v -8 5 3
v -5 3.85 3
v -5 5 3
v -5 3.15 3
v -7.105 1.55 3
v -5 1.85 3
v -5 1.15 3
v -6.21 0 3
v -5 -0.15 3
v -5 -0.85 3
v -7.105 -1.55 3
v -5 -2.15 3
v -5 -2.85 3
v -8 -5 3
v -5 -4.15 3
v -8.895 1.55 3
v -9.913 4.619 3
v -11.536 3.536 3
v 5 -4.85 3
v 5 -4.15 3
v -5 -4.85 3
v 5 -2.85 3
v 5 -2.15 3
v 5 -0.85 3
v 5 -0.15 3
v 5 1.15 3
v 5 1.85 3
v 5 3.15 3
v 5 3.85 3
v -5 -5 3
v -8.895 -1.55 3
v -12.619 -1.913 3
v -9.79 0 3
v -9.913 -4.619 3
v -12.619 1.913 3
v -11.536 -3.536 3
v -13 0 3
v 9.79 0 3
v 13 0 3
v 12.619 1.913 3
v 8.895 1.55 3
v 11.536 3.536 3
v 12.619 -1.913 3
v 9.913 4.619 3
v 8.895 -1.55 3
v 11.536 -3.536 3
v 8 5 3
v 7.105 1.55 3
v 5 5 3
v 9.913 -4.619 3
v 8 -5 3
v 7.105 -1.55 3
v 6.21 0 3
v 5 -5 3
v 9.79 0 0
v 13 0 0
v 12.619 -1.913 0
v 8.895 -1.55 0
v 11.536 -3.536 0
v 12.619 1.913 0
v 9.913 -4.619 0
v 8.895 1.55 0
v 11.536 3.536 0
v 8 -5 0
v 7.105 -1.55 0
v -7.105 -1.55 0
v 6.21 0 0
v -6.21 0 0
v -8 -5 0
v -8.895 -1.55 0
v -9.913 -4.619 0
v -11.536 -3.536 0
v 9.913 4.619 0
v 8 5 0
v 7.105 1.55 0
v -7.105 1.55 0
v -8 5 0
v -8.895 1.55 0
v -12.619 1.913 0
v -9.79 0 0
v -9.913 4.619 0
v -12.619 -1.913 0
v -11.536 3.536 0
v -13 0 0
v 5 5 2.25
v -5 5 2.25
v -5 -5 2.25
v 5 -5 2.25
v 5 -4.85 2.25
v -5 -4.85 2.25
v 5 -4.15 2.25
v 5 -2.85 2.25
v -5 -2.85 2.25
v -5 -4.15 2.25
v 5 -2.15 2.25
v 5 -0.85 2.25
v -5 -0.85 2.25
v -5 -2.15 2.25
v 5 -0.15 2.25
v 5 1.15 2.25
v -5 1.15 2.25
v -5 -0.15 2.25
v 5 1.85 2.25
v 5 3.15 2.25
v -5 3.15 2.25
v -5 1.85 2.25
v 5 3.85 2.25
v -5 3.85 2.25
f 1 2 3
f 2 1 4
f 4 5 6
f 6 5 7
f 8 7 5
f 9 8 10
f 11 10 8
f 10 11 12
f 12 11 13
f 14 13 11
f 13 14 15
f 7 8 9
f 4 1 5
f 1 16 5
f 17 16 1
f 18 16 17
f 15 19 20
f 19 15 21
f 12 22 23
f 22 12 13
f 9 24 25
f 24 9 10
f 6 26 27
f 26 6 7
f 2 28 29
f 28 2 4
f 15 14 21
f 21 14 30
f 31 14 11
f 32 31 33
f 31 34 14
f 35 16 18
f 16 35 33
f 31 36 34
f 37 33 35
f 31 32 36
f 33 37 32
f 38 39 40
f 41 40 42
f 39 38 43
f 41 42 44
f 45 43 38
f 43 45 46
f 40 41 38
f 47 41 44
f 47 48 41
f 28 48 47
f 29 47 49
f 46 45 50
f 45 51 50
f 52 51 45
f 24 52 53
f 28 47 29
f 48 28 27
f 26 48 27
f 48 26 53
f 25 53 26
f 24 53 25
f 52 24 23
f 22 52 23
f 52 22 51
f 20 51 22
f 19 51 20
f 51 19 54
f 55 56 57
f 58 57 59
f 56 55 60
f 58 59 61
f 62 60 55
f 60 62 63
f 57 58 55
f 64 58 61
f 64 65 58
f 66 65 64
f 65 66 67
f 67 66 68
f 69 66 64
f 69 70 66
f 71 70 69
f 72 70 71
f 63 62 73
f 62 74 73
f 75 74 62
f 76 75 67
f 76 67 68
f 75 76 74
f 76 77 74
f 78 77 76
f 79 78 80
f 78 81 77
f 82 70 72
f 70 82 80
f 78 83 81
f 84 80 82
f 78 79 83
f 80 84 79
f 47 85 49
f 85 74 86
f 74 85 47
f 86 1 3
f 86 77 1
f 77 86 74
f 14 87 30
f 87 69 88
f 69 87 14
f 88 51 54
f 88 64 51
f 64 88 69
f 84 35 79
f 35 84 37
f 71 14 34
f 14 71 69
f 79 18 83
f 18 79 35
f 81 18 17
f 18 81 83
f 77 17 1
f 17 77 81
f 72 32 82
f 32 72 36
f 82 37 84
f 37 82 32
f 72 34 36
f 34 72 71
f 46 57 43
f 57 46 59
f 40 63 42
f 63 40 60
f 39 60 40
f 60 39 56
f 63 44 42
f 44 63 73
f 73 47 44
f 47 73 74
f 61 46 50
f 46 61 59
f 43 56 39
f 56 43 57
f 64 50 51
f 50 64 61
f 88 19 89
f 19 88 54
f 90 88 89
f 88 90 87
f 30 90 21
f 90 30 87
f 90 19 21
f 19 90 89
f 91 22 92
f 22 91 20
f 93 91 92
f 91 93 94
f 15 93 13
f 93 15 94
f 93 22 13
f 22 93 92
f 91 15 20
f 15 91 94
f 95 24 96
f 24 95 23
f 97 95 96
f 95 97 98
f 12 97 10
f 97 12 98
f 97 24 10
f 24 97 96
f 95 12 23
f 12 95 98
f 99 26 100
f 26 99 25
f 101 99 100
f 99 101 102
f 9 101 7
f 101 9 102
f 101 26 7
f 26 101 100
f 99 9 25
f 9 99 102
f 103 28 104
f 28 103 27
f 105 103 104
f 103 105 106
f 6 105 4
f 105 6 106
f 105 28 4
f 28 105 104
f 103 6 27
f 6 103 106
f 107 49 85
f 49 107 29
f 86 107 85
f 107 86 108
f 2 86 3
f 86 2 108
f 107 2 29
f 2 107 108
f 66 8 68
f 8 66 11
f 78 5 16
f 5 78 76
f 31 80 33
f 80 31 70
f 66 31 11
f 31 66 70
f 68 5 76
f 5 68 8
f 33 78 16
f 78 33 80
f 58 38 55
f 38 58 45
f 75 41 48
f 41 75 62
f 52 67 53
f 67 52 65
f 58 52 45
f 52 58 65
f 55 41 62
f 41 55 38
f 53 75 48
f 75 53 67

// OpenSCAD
// file: functions.scad
// PRUSA Mendel  
// Functions used in many files
// GNU GPL v3
// Josef Průša
// josefprusa@me.com
// prusadjs.cz
// http://www.reprap.org/wiki/Prusa_Mendel
// http://github.com/prusajr/PrusaMendel


module nut(d,h,horizontal=true){
cornerdiameter =  (d / 2) / cos (180 / 6);
cylinder(h = h, r = cornerdiameter, $fn = 6);
if(horizontal){
for(i = [1:6]){
	rotate([0,0,60*i]) translate([-cornerdiameter-0.2,0,0]) rotate([0,0,-45]) cube(size = [2,2,h]);
}}
}

// Based on nophead research
module polyhole(d,h) {
    n = max(round(2 * d),3);
    rotate([0,0,180])
        cylinder(h = h, r = (d / 2) / cos (180 / n), $fn = n);
}




module roundcorner(diameter){
	difference(){
		cube(size = [diameter,diameter,99], center = false);
		translate(v = [diameter, diameter, 0]) cylinder(h = 100, r=diameter, center=false,$fn = max(3*diameter,20));
	}
}

module t25_indent()
{
	union()
	{
		for(z=[-5:5])
			translate([0,-5,z*2.5])
				difference()
				{
					cube([30,10,1.25],center=true);
					translate([0, 5, 1.7])
						rotate([-45,0,0])
							cube([40,10,2],center=true);
					translate([0, 5, -1.7])
						rotate([45,0,0])
							cube([40,10,2],center=true);

				}
	}
}
// file: configuration.scad
// PRUSA Mendel  
// Configuration file
// GNU GPL v2
// Josef Pra
// josefprusa@me.com
// prusadjs.cz
// http://www.reprap.org/wiki/Prusa_Mendel
// http://github.com/prusajr/PrusaMendel


// PLEASE SELECT ONE OF THE CONFIGURATIONS BELOW
// BY UN-COMMENTING IT


variant=0; //0 for metric
//variant=1; //1 for SAE
if(variant==0){
echo("variant: metric");
}else if(variant==1){
echo("variant: sae");
} else{
echo("WARNING: INVALID CONFIGURATION");
}




vars=[
//[m8_dia,m8_nut, m4_dia, m4_nut, m3_dia, m3_nut, bush_dia, mot_shaft, bush_rod, bush_outerdia, bush_length, m5_dia, m5_nut]
[8.4, 14.8, 4.3,8.1, 3.1, 6.5, 11, 5.3, 8, 16, 11, 5.3,9.3],//metric - M3 nut was 7; M3 was 4.4
[9,15.7,5.5,10.6,5.5,10.6,11.5,5.3,7.9375,16,11,5.6, 10]//SAE
];


//BUSHING TYPE Can generate three versions
// 1 - regular old ones
// 2 - helical ones
// 3 - holders for brass or any other bought bushings
bushing_type = 2;


//Round corner diameter
round_corner_diameter = 8;


//Thin wall size
layer_height = 0.4;
perimeter_width_over_thicknes = 1.6;
infill_widht_over_thickness = 1.55;
thin_wall = 2*(perimeter_width_over_thicknes*layer_height+infill_widht_over_thickness*layer_height);
if(thin_wall<2){
	echo("Check thin wall size, its below 2mm!");
}
echo(thin_wall);


//DO NOT TOUCH THIS SECTION!
m8_diameter = vars[variant][0];
m8_nut_diameter = vars[variant][1];
m4_diameter = vars[variant][2];
m4_nut_diameter = vars[variant][3];
m3_diameter = vars[variant][4];
m3_nut_diameter = vars[variant][5];
bushing_diameter = vars[variant][6];
motor_shaft=vars[variant][7];
bushing_rodsize = vars[variant][8];
bushing_outerDiameter = vars[variant][9];
bushing_lenght = vars[variant][10];
m5_diameter = vars[variant][11];
m5_nut_diameter = vars[variant][12];



// MINI-HUXLEY VERSION (TODO, just place holder)
// include <configuration-huxley.scad>


// MEGA VERSION (TODO, just place holder)
// include <configuration-mega.scad>

// Gap between the X rods

x_rod_centres=70;
y_rod_centres=183;
belt_width=6;
belt_clamp_centres=18;
ptfe_diameter=4;
z_slot_width=3.5;

vertex_x_rod_1=[11.013,59.912];
vertex_x_rod_2=[40.274,9.249,0];
vertex_x_rod_gap=sqrt((vertex_x_rod_1.x-vertex_x_rod_2.x)*(vertex_x_rod_1.x-vertex_x_rod_2.x) +(vertex_x_rod_1.y-vertex_x_rod_2.y)*(vertex_x_rod_1.y-vertex_x_rod_2.y) );

// Some basic functions, probably should be somewhere else
module roundcorner(diameter){
	difference(){
		cube(size = [diameter,diameter,99], center = false);
		translate(v = [diameter, diameter, 0]) cylinder(h = 100, r=diameter, center=true);
	}
}

include <functions.scad>
// main file
// PRUSA Mendel  
// Belt clamp
// GNU GPL v3
// Josef Průša
// josefprusa@me.com
// prusadjs.cz
// http://www.reprap.org/wiki/Prusa_Mendel
// http://github.com/prusajr/PrusaMendel
//
// modified by neurofun

include <configuration.scad>


module beltclamp(){

clamp_height = 3;
clamp_width = 10;
clamp_length = 16;		// distance between the center of the 2 holes
belt_pitch = 2;
belt_width = 10;
tooth_width = 1.3;
tooth_heigth = .75;
offset = belt_pitch/4;
// uncomment next line for a symetric clamp
//offset = 0;

	difference(){
		// basic shape
		union(0){
			translate(v = [0,0,clamp_height/2]) cube([clamp_length,clamp_width,clamp_height], center=true);
			translate(v = [-clamp_length/2, 0, 0]) cylinder(r=clamp_width/2,h=clamp_height);
			translate(v = [clamp_length/2, 0, 0]) cylinder(r=clamp_width/2,h=clamp_height);
			}
		// screw holes
		translate(v = [-clamp_length/2, 0, -1])polyhole(m3_diameter, clamp_height+2);
		translate(v = [clamp_length/2, 0, -1]) polyhole(m3_diameter, clamp_height+2);
		// belt grip
		translate(v = [0,offset,clamp_height-tooth_heigth])
		for ( i = [round(-clamp_width/belt_pitch/2) : round(clamp_width/belt_pitch/2)]){
			translate(v = [0,belt_pitch*i,tooth_heigth])cube(size = [belt_width, tooth_width, tooth_heigth*2], center = true);
		}
	}

}

beltclamp();
